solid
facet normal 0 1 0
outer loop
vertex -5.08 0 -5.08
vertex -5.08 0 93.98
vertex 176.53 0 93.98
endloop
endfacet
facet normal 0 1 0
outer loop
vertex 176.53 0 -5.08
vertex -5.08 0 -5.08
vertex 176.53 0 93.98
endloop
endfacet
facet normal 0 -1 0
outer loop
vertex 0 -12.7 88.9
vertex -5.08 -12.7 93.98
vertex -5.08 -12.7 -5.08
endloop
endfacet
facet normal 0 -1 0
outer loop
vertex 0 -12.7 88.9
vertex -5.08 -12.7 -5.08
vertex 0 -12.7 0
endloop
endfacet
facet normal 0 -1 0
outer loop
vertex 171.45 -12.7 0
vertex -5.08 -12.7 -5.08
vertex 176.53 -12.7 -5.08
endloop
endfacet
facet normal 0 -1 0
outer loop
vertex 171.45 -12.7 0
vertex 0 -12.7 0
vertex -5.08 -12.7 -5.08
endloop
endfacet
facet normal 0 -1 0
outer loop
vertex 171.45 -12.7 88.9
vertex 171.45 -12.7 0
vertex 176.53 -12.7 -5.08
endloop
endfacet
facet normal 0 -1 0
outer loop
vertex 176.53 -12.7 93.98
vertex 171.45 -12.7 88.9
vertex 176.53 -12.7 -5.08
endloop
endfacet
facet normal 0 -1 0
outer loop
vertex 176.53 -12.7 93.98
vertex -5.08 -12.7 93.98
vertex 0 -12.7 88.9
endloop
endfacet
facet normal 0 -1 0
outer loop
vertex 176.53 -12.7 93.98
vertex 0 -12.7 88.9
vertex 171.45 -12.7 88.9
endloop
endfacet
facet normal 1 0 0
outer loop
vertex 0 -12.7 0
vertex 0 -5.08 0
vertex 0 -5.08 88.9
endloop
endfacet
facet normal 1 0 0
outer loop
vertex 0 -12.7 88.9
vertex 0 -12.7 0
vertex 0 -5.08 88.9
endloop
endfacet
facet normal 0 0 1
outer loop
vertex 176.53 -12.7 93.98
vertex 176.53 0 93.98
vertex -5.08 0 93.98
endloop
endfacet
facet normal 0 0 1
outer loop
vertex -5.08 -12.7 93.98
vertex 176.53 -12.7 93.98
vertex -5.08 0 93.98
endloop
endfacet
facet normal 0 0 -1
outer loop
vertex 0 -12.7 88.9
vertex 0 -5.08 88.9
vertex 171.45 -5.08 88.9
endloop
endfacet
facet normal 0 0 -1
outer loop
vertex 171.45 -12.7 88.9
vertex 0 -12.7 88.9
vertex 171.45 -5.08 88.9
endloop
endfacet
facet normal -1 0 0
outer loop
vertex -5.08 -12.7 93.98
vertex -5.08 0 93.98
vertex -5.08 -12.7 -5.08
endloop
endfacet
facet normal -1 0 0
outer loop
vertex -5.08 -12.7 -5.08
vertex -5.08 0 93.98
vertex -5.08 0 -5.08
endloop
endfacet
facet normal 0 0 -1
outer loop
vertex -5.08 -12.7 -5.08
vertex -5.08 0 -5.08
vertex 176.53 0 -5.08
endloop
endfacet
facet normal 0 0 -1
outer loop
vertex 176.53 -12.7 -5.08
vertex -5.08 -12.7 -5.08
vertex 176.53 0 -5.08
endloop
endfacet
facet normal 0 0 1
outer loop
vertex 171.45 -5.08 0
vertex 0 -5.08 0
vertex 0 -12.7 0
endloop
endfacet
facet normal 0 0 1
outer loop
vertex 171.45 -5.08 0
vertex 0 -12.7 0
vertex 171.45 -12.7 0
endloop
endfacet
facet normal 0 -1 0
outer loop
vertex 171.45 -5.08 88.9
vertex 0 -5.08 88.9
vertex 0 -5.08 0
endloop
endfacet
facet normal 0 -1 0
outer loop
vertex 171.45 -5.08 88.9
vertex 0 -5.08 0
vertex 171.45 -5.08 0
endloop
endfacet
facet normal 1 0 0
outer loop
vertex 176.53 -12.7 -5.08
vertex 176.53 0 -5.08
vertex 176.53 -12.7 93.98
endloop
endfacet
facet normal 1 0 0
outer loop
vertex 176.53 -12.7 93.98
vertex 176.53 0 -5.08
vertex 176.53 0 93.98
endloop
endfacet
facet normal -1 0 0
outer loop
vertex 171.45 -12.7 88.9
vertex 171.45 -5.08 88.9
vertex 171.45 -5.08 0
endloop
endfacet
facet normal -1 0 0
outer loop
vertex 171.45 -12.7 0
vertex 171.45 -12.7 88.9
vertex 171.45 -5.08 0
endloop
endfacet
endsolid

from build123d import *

# Parameters (mm, degrees)
F0_W     = 171.45
F0_H     = 5.08
F1_DEPTH = 12.7
F0_H_2   = 88.9
F2_DEPTH = 5.08


with BuildPart() as f1:
    # F0 (on Front) → F1 (new body)
    with BuildSketch(Plane.XZ):
        Polygon((0, -5.08), (0, 0), (0, 88.9), (0, 93.98), (-5.08, 93.98), (-5.08, -5.08), align=None)
        with Locations((85.725, -2.54)):
            Rectangle(F0_W, F0_H)
        Polygon((171.45, 88.9), (171.45, 0), (171.45, -5.08), (176.53, -5.08), (176.53, 88.9), align=None)
        Polygon((0, 93.98), (0, 88.9), (171.45, 88.9), (176.53, 88.9), (176.53, 93.98), align=None)
    extrude(amount=F1_DEPTH)

    # F0 (on Front) → F2 (join)
    with BuildSketch(Plane.XZ):
        with Locations((85.725, 44.45)):
            Rectangle(F0_W, F0_H_2)
    extrude(amount=F2_DEPTH)


solid = f1.part
